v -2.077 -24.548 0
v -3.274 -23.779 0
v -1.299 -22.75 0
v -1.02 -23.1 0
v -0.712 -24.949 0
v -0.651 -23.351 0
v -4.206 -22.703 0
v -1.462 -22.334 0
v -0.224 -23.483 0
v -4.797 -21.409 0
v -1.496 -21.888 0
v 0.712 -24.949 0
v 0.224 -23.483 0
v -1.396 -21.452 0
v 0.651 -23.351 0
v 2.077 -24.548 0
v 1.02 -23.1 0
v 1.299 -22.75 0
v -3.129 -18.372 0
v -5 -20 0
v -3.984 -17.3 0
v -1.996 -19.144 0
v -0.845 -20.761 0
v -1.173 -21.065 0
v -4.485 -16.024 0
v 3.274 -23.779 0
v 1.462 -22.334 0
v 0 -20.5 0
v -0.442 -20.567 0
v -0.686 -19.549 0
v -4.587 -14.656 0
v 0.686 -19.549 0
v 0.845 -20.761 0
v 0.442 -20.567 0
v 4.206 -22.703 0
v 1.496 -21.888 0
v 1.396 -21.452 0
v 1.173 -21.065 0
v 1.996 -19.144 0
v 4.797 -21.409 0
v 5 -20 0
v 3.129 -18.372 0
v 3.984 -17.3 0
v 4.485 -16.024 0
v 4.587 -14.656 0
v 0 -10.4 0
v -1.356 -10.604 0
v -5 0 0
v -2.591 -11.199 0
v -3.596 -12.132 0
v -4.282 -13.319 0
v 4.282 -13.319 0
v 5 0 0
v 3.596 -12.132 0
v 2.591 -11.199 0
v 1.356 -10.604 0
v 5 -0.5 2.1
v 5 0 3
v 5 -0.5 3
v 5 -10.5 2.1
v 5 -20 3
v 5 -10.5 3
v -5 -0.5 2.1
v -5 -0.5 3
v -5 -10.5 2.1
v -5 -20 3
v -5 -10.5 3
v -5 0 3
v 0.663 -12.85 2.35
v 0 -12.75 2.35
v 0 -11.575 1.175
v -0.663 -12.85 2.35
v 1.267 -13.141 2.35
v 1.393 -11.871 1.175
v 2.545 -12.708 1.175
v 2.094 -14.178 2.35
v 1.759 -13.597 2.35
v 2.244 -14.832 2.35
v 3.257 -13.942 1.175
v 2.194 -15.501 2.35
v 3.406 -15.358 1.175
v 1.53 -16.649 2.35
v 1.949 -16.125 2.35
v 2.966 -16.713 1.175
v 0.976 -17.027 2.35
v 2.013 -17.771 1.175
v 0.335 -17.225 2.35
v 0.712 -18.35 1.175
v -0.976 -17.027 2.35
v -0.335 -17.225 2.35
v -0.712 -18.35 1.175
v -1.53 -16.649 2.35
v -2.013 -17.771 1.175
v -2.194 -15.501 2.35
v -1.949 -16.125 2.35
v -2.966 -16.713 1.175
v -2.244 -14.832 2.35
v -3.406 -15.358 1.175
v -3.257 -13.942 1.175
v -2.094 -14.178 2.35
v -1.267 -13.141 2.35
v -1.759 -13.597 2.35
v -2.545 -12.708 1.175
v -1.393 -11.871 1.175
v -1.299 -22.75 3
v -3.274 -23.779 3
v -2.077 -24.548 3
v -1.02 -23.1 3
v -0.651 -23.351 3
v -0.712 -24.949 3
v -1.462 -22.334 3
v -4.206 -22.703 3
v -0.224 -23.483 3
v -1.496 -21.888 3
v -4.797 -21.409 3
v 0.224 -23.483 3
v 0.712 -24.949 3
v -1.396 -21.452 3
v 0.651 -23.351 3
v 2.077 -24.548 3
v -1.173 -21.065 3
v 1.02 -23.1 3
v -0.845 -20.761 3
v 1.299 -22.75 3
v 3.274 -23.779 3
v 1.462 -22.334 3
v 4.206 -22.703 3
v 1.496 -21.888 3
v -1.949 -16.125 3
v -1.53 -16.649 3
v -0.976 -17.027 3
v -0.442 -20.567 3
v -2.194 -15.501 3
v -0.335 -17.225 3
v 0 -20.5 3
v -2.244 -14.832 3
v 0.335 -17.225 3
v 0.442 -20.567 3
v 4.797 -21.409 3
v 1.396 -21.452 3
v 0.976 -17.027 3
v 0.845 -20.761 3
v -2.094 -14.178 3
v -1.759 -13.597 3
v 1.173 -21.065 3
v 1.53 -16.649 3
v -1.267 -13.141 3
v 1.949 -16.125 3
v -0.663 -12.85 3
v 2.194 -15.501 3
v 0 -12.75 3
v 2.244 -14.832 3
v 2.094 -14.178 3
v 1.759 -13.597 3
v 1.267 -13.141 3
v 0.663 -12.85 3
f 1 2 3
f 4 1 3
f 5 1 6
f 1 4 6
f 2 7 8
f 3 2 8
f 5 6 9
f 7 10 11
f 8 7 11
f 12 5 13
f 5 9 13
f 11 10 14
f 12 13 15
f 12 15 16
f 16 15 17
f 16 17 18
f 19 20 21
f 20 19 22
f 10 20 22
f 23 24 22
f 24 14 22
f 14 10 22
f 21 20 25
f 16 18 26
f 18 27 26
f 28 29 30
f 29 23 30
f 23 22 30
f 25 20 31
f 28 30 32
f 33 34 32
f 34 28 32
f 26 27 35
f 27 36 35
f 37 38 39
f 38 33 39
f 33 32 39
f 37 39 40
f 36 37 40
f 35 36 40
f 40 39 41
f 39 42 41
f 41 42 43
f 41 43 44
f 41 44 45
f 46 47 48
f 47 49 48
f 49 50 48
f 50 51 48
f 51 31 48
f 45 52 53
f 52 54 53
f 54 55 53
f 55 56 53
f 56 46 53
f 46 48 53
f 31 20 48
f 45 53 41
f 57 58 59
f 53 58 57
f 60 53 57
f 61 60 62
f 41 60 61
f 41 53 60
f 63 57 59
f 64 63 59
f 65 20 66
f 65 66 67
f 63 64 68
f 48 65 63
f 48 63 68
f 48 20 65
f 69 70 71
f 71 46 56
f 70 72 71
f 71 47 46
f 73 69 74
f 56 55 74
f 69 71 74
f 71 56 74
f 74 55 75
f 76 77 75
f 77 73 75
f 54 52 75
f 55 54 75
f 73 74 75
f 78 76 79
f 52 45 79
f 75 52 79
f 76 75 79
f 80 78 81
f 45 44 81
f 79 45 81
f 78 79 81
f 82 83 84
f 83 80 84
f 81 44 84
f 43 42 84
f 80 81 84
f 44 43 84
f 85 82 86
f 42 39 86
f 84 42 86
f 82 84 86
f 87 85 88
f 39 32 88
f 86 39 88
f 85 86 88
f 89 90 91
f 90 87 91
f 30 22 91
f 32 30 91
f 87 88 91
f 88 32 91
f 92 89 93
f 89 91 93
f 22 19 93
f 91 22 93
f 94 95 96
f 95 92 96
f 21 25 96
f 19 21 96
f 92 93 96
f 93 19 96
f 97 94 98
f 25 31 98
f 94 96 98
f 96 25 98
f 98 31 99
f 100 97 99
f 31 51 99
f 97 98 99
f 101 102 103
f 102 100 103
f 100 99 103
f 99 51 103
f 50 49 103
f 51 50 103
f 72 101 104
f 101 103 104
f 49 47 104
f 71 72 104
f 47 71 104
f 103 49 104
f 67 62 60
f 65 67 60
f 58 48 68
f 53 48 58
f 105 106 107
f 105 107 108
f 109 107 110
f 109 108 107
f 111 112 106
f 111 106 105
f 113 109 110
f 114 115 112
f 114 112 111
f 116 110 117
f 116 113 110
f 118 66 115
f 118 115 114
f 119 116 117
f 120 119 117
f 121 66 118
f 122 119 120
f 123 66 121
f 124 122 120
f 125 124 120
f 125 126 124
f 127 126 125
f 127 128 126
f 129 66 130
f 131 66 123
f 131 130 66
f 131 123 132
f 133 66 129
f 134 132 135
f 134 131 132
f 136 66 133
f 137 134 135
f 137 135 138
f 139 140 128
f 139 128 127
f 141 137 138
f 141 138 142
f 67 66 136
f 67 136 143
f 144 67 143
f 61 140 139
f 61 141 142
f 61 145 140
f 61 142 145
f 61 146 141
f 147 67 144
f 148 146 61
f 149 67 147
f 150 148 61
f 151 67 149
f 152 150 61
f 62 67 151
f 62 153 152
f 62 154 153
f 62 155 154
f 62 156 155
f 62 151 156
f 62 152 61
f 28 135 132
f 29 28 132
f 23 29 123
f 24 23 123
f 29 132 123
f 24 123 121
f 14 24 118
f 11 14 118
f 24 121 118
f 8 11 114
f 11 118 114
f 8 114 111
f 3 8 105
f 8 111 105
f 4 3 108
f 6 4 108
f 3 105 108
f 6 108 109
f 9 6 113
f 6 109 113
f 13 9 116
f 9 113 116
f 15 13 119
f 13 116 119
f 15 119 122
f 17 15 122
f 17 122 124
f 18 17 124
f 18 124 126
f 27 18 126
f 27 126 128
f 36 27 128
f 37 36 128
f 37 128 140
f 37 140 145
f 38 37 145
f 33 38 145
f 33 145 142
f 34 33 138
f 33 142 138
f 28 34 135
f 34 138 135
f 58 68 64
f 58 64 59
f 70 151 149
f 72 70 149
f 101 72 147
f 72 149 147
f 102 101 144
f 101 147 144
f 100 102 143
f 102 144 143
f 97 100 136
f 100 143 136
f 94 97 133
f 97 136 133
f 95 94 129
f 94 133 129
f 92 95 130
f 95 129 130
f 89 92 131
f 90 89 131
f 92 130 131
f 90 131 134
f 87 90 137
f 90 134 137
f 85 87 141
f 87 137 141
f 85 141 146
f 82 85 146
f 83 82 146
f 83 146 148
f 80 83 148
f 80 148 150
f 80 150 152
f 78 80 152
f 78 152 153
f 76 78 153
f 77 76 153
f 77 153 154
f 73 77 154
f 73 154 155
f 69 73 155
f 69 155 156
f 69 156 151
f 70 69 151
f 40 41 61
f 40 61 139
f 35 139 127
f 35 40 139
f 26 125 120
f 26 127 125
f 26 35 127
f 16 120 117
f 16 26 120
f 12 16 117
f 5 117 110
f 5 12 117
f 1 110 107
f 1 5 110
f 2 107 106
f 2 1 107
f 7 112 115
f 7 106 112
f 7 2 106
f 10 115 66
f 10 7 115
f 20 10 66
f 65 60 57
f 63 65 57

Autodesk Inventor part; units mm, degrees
ref_plane "YZ Plane" through (0, 0, 0) normal (1, 0, 0) x (0, 1, 0)
ref_plane "XZ Plane" through (0, 0, 0) normal (0, 1, 0) x (-1, 0, 0)
ref_plane "XY Plane" through (0, 0, 0) normal (0, 0, 1) x (1, 0, 0)
sketch "Skizze1" plane through (0, 0, 0) normal (0, 0, 1) x (1, 0, 0)
  line L0 (-7, 0) -> (7, 0) projected
  line L1 (0, -30) -> (0, 5) projected
  line L2 (5, -20) -> (-5, -20)
  line L3 (-5, -20) -> (-5, 0)
  line L4 (-5, 0) -> (5, 0)
  line L5 (5, 0) -> (5, -20)
  line L6 (5, -20) -> (-5, 0) construction
  line L7 (-5, -20) -> (5, 0) construction
  arc A0 (-5, -20) -> (5, -20) centre (0, -20) ccw
  point P0 (0, 0)
  point P1 (0, -10)
  dimension "d0" = 10
  dimension "d1" = 20
extrude "Extrusion1" add sketch "Skizze1" along normal blind 3
sketch "Skizze2" plane through (5, -20, 0) normal (1, 0, 0) x (0, 0, -1)
  line L0 (0, 0) -> (0, 20) projected
  line L1 (0, 20) -> (-3, 20) projected
  line L2 (-3, 0) -> (-3, 20) projected
  line L3 (0, 0) -> (-3, 0) projected
  line L4 (-3, 0) -> (-3, 20) projected
  line L5 (-3, 9.5) -> (-2.1, 9.5)
  line L6 (-2.1, 9.5) -> (-2.1, 19.5)
  line L7 (-2.1, 19.5) -> (-3, 19.5)
  line L8 (-3, 19.5) -> (-3, 9.5)
  point P0 (0, 20)
  point P1 (-2.55, 19.5)
  point P2 (-3, 19.5)
  dimension "d4" = 0.9
  dimension "d5" = 0.5
  dimension "d6" = 10
extrude "Extrusion2" cut sketch "Skizze2" against normal through all contours L2 L7 L6 L5
sketch "Skizze4" plane through (0, 0, 0) normal (0, 0, -1) x (-1, 0, 0)
  arc A0 (-5, -20) -> (5, -20) centre (0, -20) ccw projected
  line L0 (5, 0) -> (5, -20) projected
  line L1 (-5, 0) -> (5, 0) projected
  line L2 (-5, -20) -> (-5, 0) projected
  line L3 (0, -32.4) -> (0, 5.4) projected
  line L4 (7, 0) -> (-7, 0) projected
  point P0 (0, 0)
  point P1 (0, -15)
  dimension "d9" = 5
hole "Bohrung1" at (0, -15, 0) direction (0, 0, 1) diameter 4.5 end through all countersink diameter 9.2 countersink angle 90
sketch "Skizze5" plane through (0, 0, 0) normal (0, 0, -1) x (-1, 0, 0)
  line L0 (0, -30) -> (0, 5) projected
  line L1 (7, 0) -> (-7, 0) projected
  circle A0 centre (0, -15) radius 4.6 projected
  point P0 (0, 0)
  point P1 (0, -22)
  dimension "d17" = 7
hole "Bohrung2" at (0, -22, 0) direction (0, 0, 1) diameter 3 end through all
properties part number "24_0497_007"
